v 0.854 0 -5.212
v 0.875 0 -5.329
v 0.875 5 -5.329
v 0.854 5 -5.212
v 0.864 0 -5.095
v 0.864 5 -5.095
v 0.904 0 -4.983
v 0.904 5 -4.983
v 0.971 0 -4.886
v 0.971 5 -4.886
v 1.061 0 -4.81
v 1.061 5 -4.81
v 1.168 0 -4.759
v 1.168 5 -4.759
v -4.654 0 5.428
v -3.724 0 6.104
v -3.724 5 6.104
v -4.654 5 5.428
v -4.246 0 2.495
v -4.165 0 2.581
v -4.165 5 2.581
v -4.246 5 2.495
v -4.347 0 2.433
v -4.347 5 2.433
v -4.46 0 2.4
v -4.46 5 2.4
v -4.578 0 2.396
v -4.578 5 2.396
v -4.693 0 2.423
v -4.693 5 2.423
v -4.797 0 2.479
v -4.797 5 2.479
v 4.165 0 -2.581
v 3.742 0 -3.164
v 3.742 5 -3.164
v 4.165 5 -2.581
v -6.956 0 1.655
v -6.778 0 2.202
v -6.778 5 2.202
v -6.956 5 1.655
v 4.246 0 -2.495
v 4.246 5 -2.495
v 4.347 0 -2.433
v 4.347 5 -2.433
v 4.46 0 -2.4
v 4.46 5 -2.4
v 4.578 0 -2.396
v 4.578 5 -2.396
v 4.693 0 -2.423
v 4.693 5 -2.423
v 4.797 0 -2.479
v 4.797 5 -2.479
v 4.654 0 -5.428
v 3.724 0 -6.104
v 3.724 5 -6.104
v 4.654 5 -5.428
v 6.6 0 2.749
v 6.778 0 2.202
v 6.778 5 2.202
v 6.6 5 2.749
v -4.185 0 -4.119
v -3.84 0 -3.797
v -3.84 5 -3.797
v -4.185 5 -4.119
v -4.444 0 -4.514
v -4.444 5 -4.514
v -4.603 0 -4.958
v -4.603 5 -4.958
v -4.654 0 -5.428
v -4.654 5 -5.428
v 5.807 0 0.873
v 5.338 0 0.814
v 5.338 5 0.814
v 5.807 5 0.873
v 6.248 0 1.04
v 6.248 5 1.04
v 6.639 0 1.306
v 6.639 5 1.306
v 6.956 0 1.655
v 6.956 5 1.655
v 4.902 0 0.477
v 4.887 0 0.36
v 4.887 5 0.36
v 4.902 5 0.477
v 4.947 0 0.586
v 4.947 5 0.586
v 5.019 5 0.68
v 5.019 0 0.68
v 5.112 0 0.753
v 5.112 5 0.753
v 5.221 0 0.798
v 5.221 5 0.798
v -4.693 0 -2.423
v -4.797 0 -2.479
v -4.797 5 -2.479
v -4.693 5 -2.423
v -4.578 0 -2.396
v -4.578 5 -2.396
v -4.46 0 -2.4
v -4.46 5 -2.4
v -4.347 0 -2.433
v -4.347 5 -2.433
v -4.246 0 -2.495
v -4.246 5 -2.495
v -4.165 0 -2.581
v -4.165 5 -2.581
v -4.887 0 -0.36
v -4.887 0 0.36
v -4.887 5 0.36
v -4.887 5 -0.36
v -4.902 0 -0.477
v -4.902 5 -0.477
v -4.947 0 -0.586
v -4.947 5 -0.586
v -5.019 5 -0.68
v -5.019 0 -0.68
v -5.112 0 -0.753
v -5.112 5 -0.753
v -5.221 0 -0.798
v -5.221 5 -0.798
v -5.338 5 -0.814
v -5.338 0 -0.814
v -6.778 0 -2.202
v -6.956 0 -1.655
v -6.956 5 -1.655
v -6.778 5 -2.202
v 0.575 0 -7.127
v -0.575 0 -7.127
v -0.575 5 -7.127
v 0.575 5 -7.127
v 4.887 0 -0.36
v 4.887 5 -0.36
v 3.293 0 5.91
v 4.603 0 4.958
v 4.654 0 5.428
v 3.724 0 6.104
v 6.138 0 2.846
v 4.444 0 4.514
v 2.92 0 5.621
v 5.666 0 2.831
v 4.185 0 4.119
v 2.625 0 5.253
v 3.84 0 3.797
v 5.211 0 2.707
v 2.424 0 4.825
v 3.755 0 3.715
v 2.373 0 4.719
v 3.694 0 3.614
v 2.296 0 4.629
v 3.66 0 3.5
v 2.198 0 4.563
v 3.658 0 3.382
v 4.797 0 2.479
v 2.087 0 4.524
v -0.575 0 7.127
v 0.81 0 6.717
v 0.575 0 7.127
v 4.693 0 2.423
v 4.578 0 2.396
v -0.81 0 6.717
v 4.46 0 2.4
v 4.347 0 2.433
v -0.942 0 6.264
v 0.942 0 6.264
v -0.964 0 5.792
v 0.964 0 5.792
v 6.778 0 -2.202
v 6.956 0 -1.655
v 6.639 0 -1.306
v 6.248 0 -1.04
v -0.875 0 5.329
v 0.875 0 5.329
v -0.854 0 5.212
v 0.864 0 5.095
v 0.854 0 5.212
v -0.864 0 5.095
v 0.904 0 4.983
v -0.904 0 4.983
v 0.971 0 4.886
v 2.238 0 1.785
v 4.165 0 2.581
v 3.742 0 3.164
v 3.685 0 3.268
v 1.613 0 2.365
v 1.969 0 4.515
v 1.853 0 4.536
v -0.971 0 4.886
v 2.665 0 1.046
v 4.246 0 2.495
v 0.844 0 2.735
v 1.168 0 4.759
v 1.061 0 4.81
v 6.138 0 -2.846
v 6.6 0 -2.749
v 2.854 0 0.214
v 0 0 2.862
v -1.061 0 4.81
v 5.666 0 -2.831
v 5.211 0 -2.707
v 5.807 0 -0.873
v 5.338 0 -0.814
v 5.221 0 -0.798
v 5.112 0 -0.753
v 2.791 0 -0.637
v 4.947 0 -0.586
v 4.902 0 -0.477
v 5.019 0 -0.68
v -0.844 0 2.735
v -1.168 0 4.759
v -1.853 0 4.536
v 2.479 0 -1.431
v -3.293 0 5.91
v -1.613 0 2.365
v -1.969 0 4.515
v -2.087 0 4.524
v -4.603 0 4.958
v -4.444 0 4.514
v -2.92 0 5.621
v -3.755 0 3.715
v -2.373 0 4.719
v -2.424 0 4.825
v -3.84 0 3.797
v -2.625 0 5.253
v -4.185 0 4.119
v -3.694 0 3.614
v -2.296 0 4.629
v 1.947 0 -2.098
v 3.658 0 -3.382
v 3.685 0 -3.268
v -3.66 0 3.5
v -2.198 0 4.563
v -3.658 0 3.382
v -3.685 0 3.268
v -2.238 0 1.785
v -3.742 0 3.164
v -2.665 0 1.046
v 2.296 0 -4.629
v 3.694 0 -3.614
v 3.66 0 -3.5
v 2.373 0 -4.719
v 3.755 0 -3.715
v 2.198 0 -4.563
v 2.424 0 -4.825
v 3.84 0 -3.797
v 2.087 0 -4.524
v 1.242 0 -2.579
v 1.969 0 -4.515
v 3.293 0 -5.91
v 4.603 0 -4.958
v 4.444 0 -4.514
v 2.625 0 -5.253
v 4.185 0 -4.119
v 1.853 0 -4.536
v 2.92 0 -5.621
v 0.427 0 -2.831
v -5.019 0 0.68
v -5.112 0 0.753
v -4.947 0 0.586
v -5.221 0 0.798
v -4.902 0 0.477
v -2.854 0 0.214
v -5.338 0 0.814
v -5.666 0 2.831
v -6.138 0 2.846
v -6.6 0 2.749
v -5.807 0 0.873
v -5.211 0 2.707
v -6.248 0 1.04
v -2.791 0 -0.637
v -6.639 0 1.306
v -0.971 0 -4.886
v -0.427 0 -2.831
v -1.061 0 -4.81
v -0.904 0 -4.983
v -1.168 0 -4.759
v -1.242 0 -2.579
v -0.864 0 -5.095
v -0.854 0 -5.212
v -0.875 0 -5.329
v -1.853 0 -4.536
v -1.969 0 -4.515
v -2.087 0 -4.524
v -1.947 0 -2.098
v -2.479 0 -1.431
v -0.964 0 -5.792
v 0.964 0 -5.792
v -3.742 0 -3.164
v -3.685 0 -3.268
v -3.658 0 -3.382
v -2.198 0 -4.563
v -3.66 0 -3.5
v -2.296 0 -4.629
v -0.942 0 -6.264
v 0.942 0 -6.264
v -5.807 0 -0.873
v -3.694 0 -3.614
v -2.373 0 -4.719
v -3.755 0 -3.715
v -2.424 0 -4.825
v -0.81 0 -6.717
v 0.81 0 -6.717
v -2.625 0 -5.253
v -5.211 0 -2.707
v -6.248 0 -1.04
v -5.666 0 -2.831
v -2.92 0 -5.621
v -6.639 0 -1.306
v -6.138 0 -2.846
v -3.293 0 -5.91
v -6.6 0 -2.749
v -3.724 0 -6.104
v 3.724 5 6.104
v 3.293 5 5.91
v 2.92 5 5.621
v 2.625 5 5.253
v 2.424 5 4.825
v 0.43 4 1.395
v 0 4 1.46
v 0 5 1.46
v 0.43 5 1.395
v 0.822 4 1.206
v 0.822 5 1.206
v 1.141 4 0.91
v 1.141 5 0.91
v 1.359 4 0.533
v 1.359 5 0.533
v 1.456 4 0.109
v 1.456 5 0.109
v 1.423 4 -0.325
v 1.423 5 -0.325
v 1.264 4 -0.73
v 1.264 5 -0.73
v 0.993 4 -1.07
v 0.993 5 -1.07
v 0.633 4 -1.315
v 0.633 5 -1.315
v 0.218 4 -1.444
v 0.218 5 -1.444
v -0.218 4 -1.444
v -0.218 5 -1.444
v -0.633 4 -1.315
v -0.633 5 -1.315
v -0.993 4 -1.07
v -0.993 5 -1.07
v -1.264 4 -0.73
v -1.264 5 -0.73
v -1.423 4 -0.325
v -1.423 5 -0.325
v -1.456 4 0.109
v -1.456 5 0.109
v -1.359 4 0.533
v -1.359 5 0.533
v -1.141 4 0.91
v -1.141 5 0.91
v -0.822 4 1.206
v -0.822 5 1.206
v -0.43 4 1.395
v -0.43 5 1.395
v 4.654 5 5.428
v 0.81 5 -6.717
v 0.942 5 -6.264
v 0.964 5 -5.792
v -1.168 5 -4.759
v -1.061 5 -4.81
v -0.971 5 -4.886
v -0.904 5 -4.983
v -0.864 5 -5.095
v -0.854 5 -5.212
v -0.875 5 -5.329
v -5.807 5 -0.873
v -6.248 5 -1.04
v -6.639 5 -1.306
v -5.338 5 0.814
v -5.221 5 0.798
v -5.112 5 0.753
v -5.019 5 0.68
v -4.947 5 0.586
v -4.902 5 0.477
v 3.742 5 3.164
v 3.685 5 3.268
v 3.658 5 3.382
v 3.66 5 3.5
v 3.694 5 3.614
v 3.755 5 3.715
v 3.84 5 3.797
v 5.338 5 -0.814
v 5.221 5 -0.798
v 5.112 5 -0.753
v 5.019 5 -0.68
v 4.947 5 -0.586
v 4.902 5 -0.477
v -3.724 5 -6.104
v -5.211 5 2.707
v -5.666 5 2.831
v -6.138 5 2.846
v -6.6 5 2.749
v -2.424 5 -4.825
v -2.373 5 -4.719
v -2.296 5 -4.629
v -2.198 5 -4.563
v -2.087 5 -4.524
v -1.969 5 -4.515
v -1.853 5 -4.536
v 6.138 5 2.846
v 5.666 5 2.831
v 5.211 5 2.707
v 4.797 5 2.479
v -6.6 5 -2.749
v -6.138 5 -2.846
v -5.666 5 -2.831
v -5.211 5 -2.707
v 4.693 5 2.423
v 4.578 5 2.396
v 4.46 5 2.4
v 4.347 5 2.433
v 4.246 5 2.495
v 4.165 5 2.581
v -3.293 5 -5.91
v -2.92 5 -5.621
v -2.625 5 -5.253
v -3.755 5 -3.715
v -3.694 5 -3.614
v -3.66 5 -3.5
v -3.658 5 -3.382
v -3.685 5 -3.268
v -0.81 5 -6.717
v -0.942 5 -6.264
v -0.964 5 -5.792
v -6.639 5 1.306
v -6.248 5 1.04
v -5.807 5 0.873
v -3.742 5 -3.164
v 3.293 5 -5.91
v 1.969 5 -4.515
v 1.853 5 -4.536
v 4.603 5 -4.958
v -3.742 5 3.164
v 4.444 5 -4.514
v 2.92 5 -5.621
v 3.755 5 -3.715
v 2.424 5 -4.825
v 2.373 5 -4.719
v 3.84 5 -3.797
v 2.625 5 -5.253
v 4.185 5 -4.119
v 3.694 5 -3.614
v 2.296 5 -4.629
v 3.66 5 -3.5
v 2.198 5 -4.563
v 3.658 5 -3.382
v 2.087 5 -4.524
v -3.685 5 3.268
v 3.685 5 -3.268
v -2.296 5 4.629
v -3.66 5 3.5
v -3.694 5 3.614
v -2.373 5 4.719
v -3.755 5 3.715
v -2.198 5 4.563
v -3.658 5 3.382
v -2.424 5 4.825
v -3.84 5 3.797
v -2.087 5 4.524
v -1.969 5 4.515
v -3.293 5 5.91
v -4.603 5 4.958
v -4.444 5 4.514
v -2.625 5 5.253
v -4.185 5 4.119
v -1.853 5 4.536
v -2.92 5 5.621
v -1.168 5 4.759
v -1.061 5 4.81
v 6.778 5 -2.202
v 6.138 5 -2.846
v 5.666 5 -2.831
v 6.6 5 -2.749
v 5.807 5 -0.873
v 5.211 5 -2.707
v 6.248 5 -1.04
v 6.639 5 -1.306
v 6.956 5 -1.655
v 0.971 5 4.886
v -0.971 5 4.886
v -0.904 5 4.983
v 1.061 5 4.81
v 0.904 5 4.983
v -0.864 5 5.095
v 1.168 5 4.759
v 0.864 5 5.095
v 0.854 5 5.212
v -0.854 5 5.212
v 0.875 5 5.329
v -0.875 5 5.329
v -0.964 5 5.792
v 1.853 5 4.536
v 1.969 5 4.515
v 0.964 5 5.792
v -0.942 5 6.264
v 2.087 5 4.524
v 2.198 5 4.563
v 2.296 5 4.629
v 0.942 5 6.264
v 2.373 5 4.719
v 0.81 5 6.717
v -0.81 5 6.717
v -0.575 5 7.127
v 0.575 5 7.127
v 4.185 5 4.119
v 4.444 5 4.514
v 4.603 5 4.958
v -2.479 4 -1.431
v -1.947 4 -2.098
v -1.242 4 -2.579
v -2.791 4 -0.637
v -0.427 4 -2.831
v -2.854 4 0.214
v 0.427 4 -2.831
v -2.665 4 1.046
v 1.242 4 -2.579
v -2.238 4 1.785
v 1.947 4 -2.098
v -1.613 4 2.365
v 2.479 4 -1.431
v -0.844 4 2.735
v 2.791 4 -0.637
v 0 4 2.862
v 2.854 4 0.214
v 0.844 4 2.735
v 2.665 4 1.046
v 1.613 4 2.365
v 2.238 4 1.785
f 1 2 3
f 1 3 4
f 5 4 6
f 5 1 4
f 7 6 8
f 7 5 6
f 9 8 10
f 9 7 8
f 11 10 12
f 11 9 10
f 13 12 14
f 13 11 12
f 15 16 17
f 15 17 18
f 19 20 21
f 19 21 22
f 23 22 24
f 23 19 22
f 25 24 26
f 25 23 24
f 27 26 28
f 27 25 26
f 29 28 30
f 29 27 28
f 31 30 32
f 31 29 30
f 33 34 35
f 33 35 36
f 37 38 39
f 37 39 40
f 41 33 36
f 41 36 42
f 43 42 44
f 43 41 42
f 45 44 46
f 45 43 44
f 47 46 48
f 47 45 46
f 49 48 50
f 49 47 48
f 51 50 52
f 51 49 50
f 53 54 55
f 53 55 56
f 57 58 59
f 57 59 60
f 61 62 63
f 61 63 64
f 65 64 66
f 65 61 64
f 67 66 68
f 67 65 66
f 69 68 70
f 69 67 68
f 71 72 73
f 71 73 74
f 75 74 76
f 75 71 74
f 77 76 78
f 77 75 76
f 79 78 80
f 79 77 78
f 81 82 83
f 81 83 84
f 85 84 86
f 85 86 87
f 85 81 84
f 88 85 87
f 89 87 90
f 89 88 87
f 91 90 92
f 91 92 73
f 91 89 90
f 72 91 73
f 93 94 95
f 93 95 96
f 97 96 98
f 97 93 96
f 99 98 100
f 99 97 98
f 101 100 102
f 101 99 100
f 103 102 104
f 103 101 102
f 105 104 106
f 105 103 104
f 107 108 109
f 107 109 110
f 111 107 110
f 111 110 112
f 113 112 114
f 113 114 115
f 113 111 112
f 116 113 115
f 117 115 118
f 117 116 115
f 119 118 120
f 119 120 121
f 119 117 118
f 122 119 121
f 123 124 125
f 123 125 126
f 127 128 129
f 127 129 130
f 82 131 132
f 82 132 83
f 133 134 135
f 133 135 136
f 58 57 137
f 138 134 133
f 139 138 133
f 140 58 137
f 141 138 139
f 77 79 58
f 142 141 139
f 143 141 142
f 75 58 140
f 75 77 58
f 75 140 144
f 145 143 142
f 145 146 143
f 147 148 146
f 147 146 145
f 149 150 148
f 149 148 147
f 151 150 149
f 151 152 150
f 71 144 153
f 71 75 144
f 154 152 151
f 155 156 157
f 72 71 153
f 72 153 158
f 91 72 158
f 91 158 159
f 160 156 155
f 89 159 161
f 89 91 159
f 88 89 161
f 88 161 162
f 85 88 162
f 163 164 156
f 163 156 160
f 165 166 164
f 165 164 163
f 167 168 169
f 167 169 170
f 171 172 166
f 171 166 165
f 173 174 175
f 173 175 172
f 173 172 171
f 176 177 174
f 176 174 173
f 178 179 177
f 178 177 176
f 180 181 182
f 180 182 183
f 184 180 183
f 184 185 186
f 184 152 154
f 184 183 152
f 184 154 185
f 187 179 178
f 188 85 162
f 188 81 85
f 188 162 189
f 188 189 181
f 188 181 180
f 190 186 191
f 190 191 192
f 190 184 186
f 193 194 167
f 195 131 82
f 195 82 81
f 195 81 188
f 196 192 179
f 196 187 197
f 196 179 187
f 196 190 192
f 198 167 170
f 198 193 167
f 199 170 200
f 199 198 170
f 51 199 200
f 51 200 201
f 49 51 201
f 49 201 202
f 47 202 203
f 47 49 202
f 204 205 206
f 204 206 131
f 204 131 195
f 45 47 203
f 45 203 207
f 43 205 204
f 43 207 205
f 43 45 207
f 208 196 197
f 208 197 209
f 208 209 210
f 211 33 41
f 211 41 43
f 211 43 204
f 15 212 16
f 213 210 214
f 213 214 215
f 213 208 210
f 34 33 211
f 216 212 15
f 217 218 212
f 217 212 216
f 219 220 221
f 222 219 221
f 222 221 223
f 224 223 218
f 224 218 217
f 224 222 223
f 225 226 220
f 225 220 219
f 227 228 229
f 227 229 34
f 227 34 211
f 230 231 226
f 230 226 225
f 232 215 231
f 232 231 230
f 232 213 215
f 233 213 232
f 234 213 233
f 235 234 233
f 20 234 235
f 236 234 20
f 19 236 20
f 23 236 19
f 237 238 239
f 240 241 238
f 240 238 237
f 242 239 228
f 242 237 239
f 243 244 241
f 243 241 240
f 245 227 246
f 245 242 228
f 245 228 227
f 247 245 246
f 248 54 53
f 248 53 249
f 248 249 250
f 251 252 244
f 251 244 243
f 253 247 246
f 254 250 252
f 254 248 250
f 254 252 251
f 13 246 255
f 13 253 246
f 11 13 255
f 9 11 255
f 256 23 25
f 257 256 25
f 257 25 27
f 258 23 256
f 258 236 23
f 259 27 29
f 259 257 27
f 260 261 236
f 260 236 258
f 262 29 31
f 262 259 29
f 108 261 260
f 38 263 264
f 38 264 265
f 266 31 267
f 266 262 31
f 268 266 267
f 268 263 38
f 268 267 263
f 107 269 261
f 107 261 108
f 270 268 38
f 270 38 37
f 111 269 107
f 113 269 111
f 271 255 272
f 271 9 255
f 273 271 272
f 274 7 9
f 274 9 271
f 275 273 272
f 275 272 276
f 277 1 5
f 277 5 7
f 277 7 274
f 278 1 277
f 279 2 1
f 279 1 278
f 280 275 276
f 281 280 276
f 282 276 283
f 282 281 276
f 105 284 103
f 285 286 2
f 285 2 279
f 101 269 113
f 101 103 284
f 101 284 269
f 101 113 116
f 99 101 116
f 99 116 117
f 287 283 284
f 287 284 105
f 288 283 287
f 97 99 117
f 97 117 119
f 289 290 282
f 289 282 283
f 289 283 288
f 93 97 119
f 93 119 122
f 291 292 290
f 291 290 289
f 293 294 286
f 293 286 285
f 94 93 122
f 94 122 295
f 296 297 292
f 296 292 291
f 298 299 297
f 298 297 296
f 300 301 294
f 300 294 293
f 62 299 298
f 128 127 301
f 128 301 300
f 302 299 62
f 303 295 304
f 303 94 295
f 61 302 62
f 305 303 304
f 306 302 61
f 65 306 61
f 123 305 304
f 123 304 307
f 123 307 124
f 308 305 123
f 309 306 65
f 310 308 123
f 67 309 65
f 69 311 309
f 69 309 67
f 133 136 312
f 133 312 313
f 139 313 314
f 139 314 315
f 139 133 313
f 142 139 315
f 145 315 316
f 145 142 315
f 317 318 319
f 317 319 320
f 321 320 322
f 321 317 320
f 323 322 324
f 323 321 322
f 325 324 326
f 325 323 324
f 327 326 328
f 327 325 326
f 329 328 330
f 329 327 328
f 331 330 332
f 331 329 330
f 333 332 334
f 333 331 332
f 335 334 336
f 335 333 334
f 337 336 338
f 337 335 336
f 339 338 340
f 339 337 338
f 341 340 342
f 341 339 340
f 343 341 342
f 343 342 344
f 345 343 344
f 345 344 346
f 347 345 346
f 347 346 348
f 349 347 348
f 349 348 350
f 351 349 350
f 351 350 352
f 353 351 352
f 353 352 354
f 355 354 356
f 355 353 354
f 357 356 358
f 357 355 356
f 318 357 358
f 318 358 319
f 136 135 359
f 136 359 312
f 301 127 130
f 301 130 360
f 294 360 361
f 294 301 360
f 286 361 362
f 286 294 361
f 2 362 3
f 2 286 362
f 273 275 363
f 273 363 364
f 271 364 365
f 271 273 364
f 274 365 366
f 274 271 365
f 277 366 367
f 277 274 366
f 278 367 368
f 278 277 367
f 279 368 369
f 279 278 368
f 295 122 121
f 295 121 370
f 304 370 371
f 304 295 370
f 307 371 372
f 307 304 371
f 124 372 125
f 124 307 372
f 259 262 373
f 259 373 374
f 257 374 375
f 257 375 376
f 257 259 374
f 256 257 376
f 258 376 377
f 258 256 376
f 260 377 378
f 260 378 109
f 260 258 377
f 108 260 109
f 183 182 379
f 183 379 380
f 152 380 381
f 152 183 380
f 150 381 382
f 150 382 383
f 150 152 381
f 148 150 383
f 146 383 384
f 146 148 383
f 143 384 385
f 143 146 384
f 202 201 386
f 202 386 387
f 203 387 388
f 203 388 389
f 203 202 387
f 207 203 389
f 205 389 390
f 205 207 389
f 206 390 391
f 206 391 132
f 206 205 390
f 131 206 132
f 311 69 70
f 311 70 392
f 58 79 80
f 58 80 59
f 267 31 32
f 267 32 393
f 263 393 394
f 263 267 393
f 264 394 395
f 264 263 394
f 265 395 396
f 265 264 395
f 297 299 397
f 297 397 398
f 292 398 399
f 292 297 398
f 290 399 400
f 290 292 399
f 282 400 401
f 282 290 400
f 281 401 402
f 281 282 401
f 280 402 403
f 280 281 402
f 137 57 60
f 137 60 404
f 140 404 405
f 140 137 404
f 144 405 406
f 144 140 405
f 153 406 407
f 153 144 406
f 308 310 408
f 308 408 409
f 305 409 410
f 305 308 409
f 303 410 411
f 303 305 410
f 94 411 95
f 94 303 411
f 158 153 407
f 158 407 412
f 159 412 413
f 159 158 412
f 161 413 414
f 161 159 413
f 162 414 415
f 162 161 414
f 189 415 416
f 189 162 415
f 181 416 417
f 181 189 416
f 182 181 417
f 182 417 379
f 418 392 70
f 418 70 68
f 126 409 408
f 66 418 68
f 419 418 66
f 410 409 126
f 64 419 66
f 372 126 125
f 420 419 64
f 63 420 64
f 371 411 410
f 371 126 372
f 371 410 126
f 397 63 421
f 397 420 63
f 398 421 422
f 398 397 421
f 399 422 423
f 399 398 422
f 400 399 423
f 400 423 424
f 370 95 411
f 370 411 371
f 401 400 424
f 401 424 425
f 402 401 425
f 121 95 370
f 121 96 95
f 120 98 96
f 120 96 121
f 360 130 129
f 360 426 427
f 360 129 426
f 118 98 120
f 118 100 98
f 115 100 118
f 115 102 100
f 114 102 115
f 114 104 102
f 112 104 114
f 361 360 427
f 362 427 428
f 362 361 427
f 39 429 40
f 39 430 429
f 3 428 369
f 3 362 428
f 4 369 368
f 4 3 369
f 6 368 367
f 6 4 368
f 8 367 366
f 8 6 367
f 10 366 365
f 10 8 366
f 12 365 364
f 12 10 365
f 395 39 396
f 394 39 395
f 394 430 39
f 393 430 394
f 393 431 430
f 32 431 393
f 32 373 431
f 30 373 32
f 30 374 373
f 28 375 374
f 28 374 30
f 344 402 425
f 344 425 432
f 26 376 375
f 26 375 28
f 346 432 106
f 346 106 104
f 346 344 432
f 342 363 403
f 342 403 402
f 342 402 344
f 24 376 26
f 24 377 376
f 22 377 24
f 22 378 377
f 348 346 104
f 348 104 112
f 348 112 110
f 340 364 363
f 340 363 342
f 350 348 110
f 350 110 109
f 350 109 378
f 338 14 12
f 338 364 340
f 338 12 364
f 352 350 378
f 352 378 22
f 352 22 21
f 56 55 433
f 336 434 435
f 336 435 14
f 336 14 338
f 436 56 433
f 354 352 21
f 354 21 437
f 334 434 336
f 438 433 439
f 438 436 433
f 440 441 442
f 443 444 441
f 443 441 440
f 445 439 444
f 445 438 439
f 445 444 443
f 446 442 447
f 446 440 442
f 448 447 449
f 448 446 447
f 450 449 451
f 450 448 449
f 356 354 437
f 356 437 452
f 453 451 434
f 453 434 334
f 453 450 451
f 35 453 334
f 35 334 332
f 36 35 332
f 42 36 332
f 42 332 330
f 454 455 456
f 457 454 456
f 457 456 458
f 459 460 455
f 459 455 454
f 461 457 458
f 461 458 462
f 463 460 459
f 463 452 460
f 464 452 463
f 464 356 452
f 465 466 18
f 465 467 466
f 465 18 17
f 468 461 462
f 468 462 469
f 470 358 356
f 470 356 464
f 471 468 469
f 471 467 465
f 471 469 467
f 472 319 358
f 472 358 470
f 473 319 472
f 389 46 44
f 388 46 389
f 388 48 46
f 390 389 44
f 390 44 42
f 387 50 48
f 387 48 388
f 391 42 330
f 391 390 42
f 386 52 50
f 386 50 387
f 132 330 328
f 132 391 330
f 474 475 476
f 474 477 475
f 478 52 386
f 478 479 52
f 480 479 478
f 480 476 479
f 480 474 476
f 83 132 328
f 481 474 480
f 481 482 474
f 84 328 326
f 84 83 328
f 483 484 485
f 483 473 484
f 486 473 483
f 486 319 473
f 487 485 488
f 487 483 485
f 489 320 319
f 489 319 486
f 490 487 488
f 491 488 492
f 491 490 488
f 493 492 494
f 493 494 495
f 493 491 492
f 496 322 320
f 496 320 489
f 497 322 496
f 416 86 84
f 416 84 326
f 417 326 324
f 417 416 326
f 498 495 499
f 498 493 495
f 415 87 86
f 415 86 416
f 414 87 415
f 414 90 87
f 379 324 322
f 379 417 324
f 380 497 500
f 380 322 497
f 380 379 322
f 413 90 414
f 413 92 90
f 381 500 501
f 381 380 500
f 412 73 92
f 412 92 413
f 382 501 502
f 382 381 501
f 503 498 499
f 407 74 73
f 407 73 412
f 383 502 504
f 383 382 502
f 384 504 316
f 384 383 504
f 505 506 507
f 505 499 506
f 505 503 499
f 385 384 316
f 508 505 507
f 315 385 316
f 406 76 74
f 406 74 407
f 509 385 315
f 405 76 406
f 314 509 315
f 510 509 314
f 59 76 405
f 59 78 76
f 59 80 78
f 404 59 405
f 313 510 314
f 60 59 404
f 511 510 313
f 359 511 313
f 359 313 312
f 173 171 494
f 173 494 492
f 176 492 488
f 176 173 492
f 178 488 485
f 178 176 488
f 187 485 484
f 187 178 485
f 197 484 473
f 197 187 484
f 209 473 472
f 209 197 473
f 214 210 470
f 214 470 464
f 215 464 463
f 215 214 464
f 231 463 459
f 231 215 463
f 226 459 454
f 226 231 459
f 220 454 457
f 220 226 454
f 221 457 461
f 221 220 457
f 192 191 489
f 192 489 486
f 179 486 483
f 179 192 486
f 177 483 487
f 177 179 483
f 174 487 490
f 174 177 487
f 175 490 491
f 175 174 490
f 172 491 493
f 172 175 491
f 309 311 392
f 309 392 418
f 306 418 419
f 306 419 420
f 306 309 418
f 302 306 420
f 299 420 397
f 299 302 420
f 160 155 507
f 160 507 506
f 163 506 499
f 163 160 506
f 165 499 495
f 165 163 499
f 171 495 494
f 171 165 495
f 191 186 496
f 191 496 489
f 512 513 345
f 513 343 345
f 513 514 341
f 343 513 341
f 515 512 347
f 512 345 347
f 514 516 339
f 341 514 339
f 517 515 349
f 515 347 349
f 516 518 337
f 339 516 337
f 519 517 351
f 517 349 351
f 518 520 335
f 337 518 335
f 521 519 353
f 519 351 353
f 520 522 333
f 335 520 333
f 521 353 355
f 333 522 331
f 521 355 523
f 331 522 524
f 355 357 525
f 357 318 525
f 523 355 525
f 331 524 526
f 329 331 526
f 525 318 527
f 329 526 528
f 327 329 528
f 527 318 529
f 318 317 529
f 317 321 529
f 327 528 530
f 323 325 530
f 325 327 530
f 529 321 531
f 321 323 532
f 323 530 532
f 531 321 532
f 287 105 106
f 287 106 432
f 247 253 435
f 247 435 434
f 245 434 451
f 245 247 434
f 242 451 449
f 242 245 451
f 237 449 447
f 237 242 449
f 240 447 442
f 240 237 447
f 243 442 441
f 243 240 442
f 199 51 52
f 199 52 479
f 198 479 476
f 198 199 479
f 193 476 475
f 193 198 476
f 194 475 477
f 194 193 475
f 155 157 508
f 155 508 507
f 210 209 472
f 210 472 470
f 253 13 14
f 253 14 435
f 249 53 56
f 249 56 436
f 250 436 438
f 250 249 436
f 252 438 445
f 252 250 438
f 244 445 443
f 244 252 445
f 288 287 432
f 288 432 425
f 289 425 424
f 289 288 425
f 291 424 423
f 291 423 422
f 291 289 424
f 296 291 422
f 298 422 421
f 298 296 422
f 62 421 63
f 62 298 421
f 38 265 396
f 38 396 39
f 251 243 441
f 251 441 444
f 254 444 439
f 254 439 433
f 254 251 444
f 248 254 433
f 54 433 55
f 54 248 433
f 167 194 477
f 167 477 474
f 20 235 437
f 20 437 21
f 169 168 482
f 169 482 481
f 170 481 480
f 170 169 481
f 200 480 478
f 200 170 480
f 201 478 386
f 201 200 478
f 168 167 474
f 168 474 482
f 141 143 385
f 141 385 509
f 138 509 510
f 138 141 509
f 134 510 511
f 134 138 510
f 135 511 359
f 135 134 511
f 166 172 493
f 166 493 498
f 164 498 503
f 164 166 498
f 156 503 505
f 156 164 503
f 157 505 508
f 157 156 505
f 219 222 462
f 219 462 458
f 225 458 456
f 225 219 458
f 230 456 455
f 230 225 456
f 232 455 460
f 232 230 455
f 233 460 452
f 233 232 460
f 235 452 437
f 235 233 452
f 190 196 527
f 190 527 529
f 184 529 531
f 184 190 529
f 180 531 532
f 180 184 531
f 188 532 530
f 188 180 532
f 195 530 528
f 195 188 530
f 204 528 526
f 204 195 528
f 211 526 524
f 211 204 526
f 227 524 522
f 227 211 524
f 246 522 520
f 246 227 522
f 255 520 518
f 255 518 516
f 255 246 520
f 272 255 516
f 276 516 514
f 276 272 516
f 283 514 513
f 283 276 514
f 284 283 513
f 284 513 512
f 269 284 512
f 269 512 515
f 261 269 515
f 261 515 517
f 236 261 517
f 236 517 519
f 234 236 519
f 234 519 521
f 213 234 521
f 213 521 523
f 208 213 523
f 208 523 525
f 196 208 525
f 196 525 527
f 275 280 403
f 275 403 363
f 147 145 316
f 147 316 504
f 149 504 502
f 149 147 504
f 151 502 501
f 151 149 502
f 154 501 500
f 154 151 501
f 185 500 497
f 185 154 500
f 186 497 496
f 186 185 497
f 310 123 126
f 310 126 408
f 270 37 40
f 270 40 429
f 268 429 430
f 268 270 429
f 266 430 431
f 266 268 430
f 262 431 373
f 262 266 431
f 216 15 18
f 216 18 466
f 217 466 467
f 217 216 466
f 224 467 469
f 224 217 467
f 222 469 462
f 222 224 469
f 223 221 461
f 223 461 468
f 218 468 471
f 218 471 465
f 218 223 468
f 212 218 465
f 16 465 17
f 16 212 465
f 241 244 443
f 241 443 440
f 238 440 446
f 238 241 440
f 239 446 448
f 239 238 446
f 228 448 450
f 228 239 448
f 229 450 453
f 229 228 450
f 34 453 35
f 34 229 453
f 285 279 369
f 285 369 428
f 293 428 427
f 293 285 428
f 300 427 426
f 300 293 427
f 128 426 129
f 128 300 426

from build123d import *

# Parameters (mm, degrees)
SKETCH1_R           = 2.8625
BOSS_EXTRUDE1_DEPTH = 5
SKETCH2_R           = 2.8625
SKETCH2_R_2         = 1.46
BOSS_EXTRUDE2_DEPTH = 1


with BuildPart() as part:
    # Sketch1 → Boss-Extrude1 (new body)
    with BuildSketch(Plane(origin=(0, 0, 0), x_dir=(1, 0, 0), z_dir=(0, 1, 0))):
        with BuildLine():
            Line((-0.575, 7.126841867), (0, 7.126841867))
            Line((0, 7.126841867), (0.575, 7.126841867))
            ThreePointArc((0.575, 7.126841867), (0.941802699, 6.263909422), (0.875, 5.328637255))
            ThreePointArc((0.875, 5.328637255), (0.903794388, 4.983429203), (1.167554815, 4.758867066))
            Line((1.167554815, 4.758867066), (1.852620192, 4.536275832))
            ThreePointArc((1.852620192, 4.536275832), (2.198001172, 4.562915928), (2.424204523, 4.825270192))
            ThreePointArc((2.424204523, 4.825270192), (2.919899191, 5.62118691), (3.723867773, 6.103712707))
            Line((3.723867773, 6.103712707), (4.189052545, 5.765736187))
            Line((4.189052545, 5.765736187), (4.654237317, 5.427759667))
            ThreePointArc((4.654237317, 5.427759667), (4.443767969, 4.514031436), (3.839984264, 3.796646001))
            ThreePointArc((3.839984264, 3.796646001), (3.660371211, 3.500441903), (3.741763566, 3.163732829))
            Line((3.741763566, 3.163732829), (4.165157254, 2.580981412))
            ThreePointArc((4.165157254, 2.580981412), (4.460234992, 2.399523856), (4.797445315, 2.478813921))
            ThreePointArc((4.797445315, 2.478813921), (5.666298834, 2.831362057), (6.600344627, 2.74917275))
            Line((6.600344627, 2.74917275), (6.778029398, 2.202315253))
            Line((6.778029398, 2.202315253), (6.95571417, 1.655457756))
            ThreePointArc((6.95571417, 1.655457756), (6.248364912, 1.039946868), (5.338225055, 0.814465017))
            ThreePointArc((5.338225055, 0.814465017), (5.018810642, 0.680404772), (4.886745813, 0.360160182))
            Line((4.886745813, 0.360160182), (4.886745813, -0.360160182))
            ThreePointArc((4.886745813, -0.360160182), (5.018810642, -0.680404772), (5.338225055, -0.814465017))
            ThreePointArc((5.338225055, -0.814465017), (6.248364912, -1.039946868), (6.95571417, -1.655457756))
            Line((6.95571417, -1.655457756), (6.778029398, -2.202315253))
            Line((6.778029398, -2.202315253), (6.600344627, -2.74917275))
            ThreePointArc((6.600344627, -2.74917275), (5.666298834, -2.831362057), (4.797445315, -2.478813921))
            ThreePointArc((4.797445315, -2.478813921), (4.460234992, -2.399523856), (4.165157254, -2.580981412))
            Line((4.165157254, -2.580981412), (3.741763566, -3.163732829))
            ThreePointArc((3.741763566, -3.163732829), (3.660371211, -3.500441903), (3.839984264, -3.796646001))
            ThreePointArc((3.839984264, -3.796646001), (4.443767969, -4.514031436), (4.654237317, -5.427759667))
            Line((4.654237317, -5.427759667), (4.189052545, -5.765736187))
            Line((4.189052545, -5.765736187), (3.723867773, -6.103712707))
            ThreePointArc((3.723867773, -6.103712707), (2.919899191, -5.62118691), (2.424204523, -4.825270192))
            ThreePointArc((2.424204523, -4.825270192), (2.198001172, -4.562915928), (1.852620192, -4.536275832))
            Line((1.852620192, -4.536275832), (1.167554815, -4.758867066))
            ThreePointArc((1.167554815, -4.758867066), (0.903794388, -4.983429203), (0.875, -5.328637255))
            ThreePointArc((0.875, -5.328637255), (0.941802699, -6.263909422), (0.575, -7.126841867))
            Line((0.575, -7.126841867), (0, -7.126841867))
            Line((0, -7.126841867), (-0.575, -7.126841867))
            ThreePointArc((-0.575, -7.126841867), (-0.941802699, -6.263909422), (-0.875, -5.328637255))
            ThreePointArc((-0.875, -5.328637255), (-0.903794388, -4.983429203), (-1.167554815, -4.758867066))
            Line((-1.167554815, -4.758867066), (-1.852620192, -4.536275832))
            ThreePointArc((-1.852620192, -4.536275832), (-2.198001172, -4.562915928), (-2.424204523, -4.825270192))
            ThreePointArc((-2.424204523, -4.825270192), (-2.919899191, -5.62118691), (-3.723867773, -6.103712707))
            Line((-3.723867773, -6.103712707), (-4.189052545, -5.765736187))
            Line((-4.189052545, -5.765736187), (-4.654237317, -5.427759667))
            ThreePointArc((-4.654237317, -5.427759667), (-4.443767969, -4.514031436), (-3.839984264, -3.796646001))
            ThreePointArc((-3.839984264, -3.796646001), (-3.660371211, -3.500441903), (-3.741763566, -3.163732829))
            Line((-3.741763566, -3.163732829), (-4.165157254, -2.580981412))
            ThreePointArc((-4.165157254, -2.580981412), (-4.460234992, -2.399523856), (-4.797445315, -2.478813921))
            ThreePointArc((-4.797445315, -2.478813921), (-5.666298834, -2.831362057), (-6.600344627, -2.74917275))
            Line((-6.600344627, -2.74917275), (-6.778029398, -2.202315253))
            Line((-6.778029398, -2.202315253), (-6.95571417, -1.655457756))
            ThreePointArc((-6.95571417, -1.655457756), (-6.248364912, -1.039946868), (-5.338225055, -0.814465017))
            ThreePointArc((-5.338225055, -0.814465017), (-5.018810642, -0.680404772), (-4.886745813, -0.360160182))
            Line((-4.886745813, -0.360160182), (-4.886745813, 0.360160182))
            ThreePointArc((-4.886745813, 0.360160182), (-5.018810642, 0.680404772), (-5.338225055, 0.814465017))
            ThreePointArc((-5.338225055, 0.814465017), (-6.248364912, 1.039946868), (-6.95571417, 1.655457756))
            Line((-6.95571417, 1.655457756), (-6.778029398, 2.202315253))
            Line((-6.778029398, 2.202315253), (-6.600344627, 2.74917275))
            ThreePointArc((-6.600344627, 2.74917275), (-5.666298834, 2.831362057), (-4.797445315, 2.478813921))
            ThreePointArc((-4.797445315, 2.478813921), (-4.460234992, 2.399523856), (-4.165157254, 2.580981412))
            Line((-4.165157254, 2.580981412), (-3.741763566, 3.163732829))
            ThreePointArc((-3.741763566, 3.163732829), (-3.660371211, 3.500441903), (-3.839984264, 3.796646001))
            ThreePointArc((-3.839984264, 3.796646001), (-4.443767969, 4.514031436), (-4.654237317, 5.427759667))
            Line((-4.654237317, 5.427759667), (-4.189052545, 5.765736187))
            Line((-4.189052545, 5.765736187), (-3.723867773, 6.103712707))
            ThreePointArc((-3.723867773, 6.103712707), (-2.919899191, 5.62118691), (-2.424204523, 4.825270192))
            ThreePointArc((-2.424204523, 4.825270192), (-2.198001172, 4.562915928), (-1.852620192, 4.536275832))
            Line((-1.852620192, 4.536275832), (-1.167554815, 4.758867066))
            ThreePointArc((-1.167554815, 4.758867066), (-0.903794388, 4.983429203), (-0.875, 5.328637255))
            ThreePointArc((-0.875, 5.328637255), (-0.941802699, 6.263909422), (-0.575, 7.126841867))
        make_face()
        with Locations(Location((0, 0, 0), (0, 0, 270))):
            Circle(SKETCH1_R, mode=Mode.SUBTRACT)
    extrude(amount=BOSS_EXTRUDE1_DEPTH)

    # Sketch2 → Boss-Extrude2 (add)
    with BuildSketch(Plane(origin=(0, 4, 0), x_dir=(1, 0, 0), z_dir=(0, 1, 0))):
        with Locations(Location((0, 0, 0), (0, 0, 270))):
            Circle(SKETCH2_R)
        with Locations(Location((0, 0, 0), (0, 0, 270))):
            Circle(SKETCH2_R_2, mode=Mode.SUBTRACT)
    extrude(amount=BOSS_EXTRUDE2_DEPTH)


solid = part.part
